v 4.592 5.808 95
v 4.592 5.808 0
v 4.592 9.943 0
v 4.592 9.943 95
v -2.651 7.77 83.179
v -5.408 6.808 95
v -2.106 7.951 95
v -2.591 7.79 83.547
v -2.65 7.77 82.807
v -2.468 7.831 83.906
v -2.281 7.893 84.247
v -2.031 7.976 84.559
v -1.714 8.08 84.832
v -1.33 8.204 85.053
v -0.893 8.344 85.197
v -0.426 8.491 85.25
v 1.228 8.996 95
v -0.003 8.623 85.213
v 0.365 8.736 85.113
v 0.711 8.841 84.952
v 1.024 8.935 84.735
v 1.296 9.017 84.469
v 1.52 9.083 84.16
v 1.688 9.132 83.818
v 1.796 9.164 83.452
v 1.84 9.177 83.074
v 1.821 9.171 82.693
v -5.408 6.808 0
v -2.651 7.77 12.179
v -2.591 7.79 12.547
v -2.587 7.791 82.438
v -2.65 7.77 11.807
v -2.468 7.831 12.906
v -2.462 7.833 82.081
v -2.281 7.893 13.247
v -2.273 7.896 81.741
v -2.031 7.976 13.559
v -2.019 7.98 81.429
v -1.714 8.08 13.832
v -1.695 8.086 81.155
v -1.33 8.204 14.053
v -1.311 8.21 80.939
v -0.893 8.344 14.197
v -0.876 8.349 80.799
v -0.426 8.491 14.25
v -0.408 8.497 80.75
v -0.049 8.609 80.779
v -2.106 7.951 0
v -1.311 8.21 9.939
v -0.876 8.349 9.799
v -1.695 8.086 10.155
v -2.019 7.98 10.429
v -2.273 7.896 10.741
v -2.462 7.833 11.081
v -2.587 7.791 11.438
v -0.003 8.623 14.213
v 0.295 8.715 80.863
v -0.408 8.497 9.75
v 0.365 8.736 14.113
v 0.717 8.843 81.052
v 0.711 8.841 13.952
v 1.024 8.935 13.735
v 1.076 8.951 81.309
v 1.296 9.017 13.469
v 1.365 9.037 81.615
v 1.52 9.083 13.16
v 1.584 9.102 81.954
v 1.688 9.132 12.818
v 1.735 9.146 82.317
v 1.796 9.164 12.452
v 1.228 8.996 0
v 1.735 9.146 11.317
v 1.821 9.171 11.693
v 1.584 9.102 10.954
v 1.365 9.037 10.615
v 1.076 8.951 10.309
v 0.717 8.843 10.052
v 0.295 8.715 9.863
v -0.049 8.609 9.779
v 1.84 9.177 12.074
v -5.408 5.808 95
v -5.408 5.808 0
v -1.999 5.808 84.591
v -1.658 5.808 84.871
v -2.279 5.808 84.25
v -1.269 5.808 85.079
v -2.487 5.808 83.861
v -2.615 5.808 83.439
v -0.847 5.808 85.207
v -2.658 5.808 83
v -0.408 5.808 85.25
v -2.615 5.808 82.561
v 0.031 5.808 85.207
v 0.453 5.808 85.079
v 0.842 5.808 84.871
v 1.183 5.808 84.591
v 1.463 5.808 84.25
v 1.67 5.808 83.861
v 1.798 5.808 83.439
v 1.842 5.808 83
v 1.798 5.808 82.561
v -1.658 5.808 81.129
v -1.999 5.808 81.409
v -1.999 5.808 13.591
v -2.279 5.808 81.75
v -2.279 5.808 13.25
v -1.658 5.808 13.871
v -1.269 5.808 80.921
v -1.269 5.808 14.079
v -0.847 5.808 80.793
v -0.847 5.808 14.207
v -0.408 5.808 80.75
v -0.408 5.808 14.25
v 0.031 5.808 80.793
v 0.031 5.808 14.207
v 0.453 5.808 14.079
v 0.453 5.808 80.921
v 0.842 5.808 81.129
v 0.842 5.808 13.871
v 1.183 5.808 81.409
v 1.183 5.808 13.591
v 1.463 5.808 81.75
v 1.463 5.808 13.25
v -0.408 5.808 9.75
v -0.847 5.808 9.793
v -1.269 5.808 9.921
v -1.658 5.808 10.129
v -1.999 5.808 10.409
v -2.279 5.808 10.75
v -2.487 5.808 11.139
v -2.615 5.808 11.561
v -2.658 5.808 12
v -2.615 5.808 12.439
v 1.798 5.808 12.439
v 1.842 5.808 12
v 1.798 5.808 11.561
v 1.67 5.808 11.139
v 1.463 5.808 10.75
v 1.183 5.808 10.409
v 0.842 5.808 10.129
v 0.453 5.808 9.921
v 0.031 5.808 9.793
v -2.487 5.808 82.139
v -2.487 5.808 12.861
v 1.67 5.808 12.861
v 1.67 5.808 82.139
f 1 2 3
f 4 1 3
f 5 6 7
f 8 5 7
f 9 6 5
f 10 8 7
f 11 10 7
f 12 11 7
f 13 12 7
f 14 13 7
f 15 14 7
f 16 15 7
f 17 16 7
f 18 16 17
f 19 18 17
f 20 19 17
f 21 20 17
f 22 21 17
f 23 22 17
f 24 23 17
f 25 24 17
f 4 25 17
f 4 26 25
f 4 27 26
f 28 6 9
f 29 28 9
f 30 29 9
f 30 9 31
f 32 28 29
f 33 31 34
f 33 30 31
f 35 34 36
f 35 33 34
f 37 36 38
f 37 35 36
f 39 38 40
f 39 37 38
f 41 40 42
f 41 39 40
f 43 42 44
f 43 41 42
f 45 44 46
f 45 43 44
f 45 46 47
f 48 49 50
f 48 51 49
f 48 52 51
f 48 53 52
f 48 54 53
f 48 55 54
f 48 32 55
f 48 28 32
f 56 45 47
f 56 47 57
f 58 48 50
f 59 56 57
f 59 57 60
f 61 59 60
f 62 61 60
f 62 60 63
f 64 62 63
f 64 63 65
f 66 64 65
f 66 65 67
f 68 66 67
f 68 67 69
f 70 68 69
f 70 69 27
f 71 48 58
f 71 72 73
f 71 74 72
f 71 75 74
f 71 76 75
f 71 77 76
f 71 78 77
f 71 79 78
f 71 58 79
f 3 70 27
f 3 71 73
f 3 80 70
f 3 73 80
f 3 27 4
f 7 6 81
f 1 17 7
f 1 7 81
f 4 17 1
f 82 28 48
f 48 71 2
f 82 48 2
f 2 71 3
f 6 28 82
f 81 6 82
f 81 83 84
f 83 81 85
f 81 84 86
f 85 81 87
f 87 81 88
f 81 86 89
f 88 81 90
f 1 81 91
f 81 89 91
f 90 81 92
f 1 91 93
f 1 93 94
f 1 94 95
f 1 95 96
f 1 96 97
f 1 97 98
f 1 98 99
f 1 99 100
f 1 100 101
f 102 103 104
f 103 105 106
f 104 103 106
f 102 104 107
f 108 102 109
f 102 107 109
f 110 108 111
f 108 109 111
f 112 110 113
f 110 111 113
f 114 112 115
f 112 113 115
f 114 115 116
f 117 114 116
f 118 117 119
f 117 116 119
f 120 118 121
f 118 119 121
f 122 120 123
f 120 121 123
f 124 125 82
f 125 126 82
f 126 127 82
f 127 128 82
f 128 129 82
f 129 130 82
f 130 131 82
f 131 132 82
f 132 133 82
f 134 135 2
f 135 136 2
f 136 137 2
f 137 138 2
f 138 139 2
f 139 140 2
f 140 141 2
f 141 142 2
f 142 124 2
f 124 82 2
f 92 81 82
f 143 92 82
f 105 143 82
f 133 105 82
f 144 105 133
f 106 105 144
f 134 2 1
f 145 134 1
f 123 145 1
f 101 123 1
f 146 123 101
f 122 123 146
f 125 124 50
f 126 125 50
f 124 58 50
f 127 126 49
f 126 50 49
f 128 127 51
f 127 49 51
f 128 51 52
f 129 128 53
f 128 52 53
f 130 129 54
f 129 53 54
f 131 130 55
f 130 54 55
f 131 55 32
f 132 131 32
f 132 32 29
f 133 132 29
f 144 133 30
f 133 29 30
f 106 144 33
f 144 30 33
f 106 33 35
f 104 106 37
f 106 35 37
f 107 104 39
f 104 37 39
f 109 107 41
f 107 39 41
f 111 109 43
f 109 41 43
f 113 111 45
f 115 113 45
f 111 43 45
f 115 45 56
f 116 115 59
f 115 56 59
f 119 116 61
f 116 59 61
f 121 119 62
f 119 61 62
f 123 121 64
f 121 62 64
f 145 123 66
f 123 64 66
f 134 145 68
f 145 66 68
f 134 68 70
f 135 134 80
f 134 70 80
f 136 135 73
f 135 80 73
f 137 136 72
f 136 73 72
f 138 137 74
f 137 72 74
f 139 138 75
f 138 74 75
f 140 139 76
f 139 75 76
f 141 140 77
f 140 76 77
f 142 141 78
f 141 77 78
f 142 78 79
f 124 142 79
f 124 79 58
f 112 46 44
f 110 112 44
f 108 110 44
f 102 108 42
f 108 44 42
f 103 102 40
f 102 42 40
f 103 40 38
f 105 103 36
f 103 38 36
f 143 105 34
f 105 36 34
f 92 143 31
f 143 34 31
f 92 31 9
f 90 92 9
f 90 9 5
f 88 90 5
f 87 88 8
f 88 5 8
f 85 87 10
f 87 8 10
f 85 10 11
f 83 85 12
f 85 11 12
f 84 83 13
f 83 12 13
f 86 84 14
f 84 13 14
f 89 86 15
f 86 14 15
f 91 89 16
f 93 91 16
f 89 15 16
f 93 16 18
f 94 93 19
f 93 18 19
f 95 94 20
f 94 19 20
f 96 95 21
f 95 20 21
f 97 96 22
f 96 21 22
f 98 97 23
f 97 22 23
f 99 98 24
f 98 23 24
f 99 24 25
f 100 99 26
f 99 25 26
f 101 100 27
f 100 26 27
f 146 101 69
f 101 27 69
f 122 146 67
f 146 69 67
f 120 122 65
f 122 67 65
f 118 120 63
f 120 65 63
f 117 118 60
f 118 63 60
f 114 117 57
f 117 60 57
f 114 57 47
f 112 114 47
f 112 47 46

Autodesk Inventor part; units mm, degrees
ref_plane "YZ Plane" through (0, 0, 0) normal (1, 0, 0) x (0, 1, 0)
ref_plane "XZ Plane" through (0, 0, 0) normal (0, 1, 0) x (-1, 0, 0)
ref_plane "XY Plane" through (0, 0, 0) normal (0, 0, 1) x (1, 0, 0)
sketch "Sketch1" plane through (0, 0, 0) normal (0, 0, 1) x (1, 0, 0)
  line L0 (-5.4083, 6.8084) -> (-5.4083, 5.8084)
  line L1 (-5.4083, 5.8084) -> (4.5917, 5.8084)
  line L2 (4.5917, 5.8084) -> (4.5917, 9.943)
  arc A0 (4.5917, 9.943) -> (-5.4083, 6.8084) centre (35.0917, -104.875) ccw
  dimension "d24" = 1
extrude "Extrusion1" add sketch "Sketch1" along normal blind 95
sketch "Sketch4" plane through (-5.4083, 5.8084, 0) normal (0, -1, 0) x (1, 0, 0)
  line L0 (0, 95) -> (10, 95) projected
  line L1 (0, 0) -> (0, 95) projected
  line L2 (0, 0) -> (10, 0) projected
  point P0 (5.4083, 0)
  point P1 (5, 12)
  point P2 (5, 83)
  dimension "d25" = 12
  dimension "d26" = 5
  dimension "d27" = 12
  dimension "d28" = 5
hole "Hole2" at (-0.4083, 5.8084, 12) at (-0.4083, 5.8084, 83) direction (0, 1, 0) diameter 4.5 depth 8 tip angle 118 clearance for "Countersunk Flat Head Screw ISO 2009/7046" size "M4" standard "ISO"
properties part number "podkladka2" material "Ogólne"
